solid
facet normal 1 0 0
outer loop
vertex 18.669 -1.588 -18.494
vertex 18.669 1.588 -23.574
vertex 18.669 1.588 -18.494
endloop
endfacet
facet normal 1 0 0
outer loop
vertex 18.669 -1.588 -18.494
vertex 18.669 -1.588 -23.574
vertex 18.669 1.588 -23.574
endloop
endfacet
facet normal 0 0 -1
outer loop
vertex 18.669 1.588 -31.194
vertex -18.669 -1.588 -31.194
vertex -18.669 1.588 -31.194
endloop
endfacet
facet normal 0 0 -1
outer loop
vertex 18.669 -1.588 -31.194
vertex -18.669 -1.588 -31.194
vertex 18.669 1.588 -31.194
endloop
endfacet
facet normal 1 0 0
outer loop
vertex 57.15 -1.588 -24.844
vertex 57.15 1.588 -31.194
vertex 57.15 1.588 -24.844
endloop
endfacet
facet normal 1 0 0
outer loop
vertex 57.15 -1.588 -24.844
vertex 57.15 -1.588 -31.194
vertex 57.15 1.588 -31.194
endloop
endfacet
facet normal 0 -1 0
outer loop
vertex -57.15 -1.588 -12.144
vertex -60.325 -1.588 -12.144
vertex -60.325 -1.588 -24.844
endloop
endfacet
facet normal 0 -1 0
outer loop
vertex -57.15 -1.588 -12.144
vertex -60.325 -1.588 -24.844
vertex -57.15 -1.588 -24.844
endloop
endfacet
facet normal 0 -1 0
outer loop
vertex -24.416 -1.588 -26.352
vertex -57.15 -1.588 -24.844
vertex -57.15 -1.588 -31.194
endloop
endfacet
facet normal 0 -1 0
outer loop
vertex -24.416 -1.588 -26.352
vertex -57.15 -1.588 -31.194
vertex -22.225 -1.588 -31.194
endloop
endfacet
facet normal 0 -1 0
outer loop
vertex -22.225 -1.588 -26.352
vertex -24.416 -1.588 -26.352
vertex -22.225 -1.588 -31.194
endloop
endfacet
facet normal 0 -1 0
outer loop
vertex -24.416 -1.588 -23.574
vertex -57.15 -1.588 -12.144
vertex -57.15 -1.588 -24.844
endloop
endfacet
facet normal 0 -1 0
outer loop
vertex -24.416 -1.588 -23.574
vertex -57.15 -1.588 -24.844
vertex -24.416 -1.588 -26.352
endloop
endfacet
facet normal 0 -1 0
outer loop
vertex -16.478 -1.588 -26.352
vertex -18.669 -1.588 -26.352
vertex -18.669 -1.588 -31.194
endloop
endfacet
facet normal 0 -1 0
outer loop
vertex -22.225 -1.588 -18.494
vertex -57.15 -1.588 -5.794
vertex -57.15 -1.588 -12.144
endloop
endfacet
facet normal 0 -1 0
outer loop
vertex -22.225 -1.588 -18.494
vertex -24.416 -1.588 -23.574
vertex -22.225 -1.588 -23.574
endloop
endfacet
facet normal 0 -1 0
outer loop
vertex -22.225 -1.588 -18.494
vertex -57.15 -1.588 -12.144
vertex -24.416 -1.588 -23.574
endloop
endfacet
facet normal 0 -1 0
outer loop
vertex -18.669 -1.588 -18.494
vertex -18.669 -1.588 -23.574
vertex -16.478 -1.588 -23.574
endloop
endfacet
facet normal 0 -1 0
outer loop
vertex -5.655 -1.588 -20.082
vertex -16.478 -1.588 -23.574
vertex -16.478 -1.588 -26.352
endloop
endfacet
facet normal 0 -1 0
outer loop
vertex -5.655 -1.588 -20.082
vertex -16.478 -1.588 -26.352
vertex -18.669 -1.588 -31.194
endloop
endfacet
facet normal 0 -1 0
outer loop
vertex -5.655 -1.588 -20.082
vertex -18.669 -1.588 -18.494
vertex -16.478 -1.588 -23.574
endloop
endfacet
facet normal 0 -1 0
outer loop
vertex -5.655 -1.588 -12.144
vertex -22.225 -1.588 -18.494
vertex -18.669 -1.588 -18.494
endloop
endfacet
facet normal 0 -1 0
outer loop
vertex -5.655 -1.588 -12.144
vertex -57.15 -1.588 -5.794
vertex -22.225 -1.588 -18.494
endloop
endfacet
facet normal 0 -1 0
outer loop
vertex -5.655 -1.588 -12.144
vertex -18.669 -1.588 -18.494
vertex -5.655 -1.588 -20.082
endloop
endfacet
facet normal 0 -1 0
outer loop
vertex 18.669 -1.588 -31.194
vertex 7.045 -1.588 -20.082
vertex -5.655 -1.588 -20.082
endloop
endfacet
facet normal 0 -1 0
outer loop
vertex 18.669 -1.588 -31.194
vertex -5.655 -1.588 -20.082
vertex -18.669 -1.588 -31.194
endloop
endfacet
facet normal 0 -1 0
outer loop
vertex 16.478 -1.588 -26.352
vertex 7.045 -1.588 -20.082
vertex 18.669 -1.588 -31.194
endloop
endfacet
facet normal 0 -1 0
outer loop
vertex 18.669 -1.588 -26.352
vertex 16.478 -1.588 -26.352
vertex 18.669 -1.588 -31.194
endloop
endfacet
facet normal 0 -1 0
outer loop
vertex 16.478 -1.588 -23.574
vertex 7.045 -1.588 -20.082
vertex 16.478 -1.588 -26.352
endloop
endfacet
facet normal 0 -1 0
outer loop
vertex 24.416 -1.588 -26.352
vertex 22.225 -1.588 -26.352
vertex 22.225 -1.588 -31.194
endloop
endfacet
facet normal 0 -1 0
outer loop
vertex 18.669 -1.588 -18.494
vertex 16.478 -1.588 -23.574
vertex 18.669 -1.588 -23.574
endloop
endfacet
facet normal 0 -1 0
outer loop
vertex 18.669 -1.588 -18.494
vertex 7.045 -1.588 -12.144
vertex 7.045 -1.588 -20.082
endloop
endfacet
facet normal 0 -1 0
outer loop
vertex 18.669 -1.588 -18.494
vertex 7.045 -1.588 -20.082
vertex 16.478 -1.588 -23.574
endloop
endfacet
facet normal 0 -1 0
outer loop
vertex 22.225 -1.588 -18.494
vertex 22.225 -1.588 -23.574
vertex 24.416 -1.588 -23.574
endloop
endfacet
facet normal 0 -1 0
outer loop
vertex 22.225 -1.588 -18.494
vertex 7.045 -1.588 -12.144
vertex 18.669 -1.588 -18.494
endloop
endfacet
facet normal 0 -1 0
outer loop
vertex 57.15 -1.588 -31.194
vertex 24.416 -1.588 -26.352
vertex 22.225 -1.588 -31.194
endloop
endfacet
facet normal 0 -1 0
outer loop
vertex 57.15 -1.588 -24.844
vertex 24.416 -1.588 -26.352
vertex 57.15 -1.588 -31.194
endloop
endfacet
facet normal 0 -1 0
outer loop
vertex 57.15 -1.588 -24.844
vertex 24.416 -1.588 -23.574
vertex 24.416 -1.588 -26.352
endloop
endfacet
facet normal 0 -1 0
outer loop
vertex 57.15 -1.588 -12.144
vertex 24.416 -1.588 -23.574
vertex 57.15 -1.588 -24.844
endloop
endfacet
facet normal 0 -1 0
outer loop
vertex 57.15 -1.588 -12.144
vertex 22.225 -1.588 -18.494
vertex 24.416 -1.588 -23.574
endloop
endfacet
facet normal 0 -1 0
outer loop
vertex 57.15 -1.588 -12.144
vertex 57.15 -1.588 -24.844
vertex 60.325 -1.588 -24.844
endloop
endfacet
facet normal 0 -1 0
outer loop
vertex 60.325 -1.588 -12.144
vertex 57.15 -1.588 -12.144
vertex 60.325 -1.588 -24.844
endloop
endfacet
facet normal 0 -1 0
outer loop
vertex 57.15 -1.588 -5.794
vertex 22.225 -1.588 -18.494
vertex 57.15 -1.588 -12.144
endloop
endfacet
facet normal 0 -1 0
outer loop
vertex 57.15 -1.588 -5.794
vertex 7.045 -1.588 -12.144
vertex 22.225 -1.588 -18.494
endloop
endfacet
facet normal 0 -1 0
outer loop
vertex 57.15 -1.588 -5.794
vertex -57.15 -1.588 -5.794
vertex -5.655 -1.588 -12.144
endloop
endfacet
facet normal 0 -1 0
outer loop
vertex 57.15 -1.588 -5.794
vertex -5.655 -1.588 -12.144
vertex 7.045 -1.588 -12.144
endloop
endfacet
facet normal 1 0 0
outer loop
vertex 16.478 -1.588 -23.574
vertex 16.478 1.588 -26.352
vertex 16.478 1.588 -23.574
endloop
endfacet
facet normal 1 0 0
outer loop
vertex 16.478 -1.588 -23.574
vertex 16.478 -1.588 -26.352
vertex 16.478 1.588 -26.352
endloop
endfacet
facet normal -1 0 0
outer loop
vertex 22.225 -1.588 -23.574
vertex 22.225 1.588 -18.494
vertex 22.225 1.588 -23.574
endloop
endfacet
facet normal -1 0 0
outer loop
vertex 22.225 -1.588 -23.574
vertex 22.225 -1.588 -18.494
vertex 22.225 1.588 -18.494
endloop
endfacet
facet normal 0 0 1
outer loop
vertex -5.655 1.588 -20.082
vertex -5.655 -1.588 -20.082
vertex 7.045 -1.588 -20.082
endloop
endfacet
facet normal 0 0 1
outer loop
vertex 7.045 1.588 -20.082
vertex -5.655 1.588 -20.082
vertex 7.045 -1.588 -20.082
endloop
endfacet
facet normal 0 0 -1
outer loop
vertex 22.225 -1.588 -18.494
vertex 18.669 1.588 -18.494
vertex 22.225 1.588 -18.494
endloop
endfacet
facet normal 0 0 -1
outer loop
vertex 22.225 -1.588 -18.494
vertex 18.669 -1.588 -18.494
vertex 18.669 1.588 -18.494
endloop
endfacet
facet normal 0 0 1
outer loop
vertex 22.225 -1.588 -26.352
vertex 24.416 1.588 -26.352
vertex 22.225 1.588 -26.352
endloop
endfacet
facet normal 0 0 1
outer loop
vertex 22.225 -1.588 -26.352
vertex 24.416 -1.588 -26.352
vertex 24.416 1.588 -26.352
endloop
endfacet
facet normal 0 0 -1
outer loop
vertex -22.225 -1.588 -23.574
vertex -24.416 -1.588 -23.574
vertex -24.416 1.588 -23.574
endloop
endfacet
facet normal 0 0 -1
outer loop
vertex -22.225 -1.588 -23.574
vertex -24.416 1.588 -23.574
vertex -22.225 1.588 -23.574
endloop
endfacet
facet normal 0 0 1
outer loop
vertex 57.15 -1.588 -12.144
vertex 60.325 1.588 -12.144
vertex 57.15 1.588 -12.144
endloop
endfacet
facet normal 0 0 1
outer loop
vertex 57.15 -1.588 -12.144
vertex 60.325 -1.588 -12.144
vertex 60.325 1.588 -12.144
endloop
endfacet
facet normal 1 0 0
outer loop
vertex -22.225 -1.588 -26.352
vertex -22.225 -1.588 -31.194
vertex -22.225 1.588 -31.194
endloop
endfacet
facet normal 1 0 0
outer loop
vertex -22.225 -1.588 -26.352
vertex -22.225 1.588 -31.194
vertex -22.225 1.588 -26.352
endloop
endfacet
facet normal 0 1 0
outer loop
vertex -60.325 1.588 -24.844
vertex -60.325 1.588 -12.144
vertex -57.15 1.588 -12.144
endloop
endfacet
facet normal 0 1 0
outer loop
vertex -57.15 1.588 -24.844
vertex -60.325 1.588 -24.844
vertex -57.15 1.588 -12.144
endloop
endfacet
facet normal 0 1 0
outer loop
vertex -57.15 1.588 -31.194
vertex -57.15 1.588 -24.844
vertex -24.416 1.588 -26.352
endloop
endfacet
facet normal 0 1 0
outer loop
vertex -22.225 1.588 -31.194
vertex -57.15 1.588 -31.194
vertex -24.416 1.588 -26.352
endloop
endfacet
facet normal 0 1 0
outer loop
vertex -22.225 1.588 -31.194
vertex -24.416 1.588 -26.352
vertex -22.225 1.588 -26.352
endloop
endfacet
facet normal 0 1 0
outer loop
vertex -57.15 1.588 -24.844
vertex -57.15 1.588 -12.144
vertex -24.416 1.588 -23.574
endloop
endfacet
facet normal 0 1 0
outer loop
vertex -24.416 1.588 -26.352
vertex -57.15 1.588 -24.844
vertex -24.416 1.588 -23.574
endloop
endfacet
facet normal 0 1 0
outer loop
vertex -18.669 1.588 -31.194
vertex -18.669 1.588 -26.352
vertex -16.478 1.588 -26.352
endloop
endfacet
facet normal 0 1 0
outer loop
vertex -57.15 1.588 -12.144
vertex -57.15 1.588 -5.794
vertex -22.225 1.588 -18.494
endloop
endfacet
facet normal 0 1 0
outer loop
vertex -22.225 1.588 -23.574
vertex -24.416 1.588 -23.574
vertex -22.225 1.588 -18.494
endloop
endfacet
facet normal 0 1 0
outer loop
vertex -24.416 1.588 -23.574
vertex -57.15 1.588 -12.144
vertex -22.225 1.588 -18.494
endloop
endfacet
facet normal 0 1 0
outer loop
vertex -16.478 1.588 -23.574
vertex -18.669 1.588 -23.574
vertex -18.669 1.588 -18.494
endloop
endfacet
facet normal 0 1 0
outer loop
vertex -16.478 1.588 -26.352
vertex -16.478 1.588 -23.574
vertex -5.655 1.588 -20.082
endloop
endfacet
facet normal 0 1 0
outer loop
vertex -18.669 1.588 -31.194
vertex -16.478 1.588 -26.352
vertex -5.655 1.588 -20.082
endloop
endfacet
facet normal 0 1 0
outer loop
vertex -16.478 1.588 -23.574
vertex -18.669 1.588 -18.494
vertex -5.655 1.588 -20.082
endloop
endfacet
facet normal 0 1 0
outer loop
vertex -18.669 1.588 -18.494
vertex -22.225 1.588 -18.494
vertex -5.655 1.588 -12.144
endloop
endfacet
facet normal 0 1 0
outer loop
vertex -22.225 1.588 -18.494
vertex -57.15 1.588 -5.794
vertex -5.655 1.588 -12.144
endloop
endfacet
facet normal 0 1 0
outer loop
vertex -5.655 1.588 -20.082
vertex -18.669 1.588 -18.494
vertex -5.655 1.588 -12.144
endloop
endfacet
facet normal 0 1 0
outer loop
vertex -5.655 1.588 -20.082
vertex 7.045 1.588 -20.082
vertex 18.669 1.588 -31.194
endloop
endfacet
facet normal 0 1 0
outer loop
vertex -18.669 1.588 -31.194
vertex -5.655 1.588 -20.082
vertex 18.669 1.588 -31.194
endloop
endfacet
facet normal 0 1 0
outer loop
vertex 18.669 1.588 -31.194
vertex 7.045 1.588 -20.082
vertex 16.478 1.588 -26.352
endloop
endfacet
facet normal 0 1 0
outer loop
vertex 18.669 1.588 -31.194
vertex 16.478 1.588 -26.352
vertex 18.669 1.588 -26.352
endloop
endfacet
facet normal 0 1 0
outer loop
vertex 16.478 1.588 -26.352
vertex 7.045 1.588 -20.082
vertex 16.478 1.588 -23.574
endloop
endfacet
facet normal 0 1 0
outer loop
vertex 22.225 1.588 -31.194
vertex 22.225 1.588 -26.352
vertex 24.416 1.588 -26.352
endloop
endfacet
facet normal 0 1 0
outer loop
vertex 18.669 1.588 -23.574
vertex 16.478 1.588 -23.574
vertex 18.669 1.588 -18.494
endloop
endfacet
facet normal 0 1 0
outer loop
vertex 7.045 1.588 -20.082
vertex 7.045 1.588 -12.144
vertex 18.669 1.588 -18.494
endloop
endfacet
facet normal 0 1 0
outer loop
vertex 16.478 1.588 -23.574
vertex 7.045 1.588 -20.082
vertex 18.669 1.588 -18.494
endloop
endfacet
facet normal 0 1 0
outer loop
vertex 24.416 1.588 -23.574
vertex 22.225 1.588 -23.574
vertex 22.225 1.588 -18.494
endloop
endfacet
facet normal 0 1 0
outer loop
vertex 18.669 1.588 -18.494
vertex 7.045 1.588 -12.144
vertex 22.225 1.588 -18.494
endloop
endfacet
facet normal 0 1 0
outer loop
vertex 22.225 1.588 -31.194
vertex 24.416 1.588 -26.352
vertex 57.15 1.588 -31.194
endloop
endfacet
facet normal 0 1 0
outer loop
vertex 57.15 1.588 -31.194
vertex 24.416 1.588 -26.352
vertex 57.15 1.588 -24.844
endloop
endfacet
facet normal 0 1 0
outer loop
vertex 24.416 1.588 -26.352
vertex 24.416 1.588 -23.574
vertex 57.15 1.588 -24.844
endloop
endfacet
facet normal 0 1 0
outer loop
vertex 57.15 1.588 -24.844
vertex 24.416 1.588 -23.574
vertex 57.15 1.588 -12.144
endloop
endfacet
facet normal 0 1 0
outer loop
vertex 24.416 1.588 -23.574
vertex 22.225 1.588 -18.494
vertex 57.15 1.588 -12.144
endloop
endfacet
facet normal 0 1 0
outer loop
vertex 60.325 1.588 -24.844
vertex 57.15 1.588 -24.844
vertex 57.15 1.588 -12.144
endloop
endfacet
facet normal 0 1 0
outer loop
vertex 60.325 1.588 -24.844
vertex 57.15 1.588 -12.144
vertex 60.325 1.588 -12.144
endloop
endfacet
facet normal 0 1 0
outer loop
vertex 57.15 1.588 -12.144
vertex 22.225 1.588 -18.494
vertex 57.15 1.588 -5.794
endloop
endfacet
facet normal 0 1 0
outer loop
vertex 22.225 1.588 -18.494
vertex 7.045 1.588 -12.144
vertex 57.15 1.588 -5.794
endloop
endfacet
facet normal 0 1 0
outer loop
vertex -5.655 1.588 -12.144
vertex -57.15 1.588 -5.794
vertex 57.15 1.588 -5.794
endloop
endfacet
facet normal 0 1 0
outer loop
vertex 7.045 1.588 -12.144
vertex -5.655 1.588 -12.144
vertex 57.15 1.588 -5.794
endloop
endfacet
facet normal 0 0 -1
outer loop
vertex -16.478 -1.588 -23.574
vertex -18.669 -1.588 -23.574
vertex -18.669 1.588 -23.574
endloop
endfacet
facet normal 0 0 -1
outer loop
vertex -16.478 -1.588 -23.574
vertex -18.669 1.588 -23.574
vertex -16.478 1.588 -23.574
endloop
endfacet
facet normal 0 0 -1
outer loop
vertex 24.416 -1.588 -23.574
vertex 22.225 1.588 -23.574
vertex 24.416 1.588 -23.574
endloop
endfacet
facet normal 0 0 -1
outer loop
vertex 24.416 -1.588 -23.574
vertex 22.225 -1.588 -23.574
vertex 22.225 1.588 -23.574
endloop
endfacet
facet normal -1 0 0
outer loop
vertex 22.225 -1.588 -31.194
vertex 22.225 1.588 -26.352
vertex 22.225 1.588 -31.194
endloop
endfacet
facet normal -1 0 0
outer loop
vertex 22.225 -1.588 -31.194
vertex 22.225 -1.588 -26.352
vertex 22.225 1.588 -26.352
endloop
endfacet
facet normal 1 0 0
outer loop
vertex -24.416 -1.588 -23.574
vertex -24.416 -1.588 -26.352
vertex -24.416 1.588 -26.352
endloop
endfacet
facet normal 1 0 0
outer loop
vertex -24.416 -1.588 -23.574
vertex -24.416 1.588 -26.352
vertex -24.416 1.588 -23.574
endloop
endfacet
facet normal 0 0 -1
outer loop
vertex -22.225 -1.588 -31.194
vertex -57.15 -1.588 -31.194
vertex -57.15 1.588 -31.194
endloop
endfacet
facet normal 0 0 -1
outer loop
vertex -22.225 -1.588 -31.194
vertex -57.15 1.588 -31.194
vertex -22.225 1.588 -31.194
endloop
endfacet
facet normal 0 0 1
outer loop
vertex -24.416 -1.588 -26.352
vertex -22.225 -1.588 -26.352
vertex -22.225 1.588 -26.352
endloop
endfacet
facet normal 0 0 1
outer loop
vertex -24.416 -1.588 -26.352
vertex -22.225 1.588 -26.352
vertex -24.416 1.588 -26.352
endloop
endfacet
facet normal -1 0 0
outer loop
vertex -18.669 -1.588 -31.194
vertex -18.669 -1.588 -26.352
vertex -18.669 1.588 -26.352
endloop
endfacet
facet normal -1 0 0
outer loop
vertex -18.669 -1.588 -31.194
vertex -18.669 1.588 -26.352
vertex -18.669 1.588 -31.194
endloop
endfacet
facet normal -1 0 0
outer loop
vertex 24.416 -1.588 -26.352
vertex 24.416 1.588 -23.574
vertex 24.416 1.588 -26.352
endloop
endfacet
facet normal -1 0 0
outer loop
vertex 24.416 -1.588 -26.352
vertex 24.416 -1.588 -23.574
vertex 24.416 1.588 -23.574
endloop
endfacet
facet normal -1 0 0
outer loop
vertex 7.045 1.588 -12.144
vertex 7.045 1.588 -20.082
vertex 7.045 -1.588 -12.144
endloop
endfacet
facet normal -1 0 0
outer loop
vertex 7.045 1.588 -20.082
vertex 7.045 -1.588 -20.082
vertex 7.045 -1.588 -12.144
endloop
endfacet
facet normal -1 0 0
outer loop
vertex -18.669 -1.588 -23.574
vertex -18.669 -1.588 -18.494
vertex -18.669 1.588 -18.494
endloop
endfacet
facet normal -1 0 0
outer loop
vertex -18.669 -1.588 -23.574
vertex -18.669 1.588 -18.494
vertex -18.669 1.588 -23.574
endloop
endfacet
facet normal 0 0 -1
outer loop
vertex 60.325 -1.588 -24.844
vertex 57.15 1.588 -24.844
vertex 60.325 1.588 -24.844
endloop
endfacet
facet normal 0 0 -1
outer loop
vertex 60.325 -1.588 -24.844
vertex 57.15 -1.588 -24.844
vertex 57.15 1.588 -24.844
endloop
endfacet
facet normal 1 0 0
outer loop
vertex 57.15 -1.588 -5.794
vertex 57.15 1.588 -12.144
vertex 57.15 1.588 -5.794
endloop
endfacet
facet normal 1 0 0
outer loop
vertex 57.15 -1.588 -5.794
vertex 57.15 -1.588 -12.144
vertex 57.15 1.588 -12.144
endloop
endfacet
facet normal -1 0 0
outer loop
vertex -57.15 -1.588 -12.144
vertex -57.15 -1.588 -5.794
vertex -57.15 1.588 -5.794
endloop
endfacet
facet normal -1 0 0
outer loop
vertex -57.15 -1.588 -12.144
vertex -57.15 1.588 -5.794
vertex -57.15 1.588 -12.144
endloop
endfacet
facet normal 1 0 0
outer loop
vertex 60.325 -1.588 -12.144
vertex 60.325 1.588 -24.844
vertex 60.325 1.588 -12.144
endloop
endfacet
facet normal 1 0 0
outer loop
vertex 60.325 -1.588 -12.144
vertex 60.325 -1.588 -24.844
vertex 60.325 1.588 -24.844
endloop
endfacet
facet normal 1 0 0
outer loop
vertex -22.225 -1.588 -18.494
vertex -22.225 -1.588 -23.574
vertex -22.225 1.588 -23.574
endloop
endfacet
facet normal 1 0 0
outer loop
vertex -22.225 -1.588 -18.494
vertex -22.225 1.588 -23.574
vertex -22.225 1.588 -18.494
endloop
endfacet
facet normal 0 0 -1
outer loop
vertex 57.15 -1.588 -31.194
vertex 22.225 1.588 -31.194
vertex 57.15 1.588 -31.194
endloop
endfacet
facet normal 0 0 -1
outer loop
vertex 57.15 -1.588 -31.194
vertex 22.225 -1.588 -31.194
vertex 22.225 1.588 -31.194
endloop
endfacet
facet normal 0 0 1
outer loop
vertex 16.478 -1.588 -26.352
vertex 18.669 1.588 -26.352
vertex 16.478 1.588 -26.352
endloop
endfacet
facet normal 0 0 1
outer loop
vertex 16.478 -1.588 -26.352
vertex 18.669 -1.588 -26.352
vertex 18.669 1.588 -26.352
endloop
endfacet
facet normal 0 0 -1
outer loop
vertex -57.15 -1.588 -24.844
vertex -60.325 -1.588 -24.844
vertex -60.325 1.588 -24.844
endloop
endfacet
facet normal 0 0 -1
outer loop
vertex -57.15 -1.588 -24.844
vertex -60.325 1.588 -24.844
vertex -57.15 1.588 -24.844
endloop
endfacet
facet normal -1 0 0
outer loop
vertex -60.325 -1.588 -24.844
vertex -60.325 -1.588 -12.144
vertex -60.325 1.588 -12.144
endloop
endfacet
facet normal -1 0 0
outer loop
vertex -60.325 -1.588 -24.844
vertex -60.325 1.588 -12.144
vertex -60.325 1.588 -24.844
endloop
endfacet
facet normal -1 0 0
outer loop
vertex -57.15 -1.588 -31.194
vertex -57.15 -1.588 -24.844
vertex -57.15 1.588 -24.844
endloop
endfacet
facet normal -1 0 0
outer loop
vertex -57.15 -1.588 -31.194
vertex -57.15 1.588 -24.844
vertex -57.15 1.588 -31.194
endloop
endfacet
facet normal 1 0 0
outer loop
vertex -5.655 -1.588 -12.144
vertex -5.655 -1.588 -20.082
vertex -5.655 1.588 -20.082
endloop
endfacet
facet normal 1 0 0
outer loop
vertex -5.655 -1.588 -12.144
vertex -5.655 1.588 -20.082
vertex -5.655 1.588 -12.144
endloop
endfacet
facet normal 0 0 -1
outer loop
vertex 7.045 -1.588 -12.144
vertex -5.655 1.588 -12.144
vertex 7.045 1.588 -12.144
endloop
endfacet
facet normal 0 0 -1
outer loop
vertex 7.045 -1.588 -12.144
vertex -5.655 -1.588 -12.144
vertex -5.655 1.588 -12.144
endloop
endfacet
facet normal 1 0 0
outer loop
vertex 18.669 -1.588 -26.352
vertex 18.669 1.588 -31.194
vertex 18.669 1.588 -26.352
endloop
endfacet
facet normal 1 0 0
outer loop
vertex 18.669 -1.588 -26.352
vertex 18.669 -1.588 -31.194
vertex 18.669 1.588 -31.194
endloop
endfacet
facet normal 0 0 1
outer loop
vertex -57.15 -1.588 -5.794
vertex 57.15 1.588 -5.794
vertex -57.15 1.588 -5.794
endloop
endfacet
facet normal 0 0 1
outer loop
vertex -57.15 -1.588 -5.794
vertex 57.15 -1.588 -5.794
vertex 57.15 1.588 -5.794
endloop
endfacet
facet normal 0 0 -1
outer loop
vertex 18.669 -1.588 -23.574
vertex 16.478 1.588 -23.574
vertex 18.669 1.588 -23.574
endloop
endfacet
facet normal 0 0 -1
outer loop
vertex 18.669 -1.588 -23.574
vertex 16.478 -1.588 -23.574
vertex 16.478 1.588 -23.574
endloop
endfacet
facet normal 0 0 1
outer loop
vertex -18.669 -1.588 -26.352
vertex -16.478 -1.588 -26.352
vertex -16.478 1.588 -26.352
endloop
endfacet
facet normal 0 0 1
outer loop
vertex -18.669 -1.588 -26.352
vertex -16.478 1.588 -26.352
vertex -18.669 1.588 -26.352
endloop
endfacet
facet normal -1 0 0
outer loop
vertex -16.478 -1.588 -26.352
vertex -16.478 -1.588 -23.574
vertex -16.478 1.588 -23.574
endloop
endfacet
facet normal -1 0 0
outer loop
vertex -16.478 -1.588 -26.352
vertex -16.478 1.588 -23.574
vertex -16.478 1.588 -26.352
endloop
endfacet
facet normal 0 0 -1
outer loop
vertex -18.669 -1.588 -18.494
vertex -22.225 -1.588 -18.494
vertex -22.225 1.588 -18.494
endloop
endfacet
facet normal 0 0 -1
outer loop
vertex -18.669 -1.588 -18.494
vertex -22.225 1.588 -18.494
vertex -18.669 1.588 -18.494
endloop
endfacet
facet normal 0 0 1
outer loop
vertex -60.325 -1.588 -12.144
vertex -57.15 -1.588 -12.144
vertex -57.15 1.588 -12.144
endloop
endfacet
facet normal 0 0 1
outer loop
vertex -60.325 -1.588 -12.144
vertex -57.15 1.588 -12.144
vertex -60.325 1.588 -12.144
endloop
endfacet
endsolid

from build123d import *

# Parameters (mm, degrees)
F0_W     = 12.7
F0_H     = 7.9375
F1_DEPTH = 1.5875


with BuildPart() as f1:
    # F0 (on Front) → F1 (new body, symmetric)
    with BuildSketch(Plane.XZ):
        Polygon((57.15, -5.794347), (-57.15, -5.794347), (-57.15, -12.144347), (-60.325, -12.144347), (-60.325, -24.844347), (-57.15, -24.844347), (-57.15, -31.194347), (-22.225, -31.194347), (-22.225, -26.352472), (-24.41575, -26.352472), (-24.41575, -23.574347), (-22.225, -23.574347), (-22.225, -18.494347), (-18.669, -18.494347), (-18.669, -23.574347), (-16.47825, -23.574347), (-16.47825, -26.352472), (-18.669, -26.352472), (-18.669, -31.194347), (18.669, -31.194347), (18.669, -26.352472), (16.47825, -26.352472), (16.47825, -23.574347), (18.669, -23.574347), (18.669, -18.494347), (22.225, -18.494347), (22.225, -23.574347), (24.41575, -23.574347), (24.41575, -26.352472), (22.225, -26.352472), (22.225, -31.194347), (57.15, -31.194347), (57.15, -24.844347), (60.325, -24.844347), (60.325, -12.144347), (57.15, -12.144347), align=None)
        with Locations((0.695352, -16.113097)):
            Rectangle(F0_W, F0_H, mode=Mode.SUBTRACT)
    extrude(amount=F1_DEPTH, both=True)


solid = f1.part
